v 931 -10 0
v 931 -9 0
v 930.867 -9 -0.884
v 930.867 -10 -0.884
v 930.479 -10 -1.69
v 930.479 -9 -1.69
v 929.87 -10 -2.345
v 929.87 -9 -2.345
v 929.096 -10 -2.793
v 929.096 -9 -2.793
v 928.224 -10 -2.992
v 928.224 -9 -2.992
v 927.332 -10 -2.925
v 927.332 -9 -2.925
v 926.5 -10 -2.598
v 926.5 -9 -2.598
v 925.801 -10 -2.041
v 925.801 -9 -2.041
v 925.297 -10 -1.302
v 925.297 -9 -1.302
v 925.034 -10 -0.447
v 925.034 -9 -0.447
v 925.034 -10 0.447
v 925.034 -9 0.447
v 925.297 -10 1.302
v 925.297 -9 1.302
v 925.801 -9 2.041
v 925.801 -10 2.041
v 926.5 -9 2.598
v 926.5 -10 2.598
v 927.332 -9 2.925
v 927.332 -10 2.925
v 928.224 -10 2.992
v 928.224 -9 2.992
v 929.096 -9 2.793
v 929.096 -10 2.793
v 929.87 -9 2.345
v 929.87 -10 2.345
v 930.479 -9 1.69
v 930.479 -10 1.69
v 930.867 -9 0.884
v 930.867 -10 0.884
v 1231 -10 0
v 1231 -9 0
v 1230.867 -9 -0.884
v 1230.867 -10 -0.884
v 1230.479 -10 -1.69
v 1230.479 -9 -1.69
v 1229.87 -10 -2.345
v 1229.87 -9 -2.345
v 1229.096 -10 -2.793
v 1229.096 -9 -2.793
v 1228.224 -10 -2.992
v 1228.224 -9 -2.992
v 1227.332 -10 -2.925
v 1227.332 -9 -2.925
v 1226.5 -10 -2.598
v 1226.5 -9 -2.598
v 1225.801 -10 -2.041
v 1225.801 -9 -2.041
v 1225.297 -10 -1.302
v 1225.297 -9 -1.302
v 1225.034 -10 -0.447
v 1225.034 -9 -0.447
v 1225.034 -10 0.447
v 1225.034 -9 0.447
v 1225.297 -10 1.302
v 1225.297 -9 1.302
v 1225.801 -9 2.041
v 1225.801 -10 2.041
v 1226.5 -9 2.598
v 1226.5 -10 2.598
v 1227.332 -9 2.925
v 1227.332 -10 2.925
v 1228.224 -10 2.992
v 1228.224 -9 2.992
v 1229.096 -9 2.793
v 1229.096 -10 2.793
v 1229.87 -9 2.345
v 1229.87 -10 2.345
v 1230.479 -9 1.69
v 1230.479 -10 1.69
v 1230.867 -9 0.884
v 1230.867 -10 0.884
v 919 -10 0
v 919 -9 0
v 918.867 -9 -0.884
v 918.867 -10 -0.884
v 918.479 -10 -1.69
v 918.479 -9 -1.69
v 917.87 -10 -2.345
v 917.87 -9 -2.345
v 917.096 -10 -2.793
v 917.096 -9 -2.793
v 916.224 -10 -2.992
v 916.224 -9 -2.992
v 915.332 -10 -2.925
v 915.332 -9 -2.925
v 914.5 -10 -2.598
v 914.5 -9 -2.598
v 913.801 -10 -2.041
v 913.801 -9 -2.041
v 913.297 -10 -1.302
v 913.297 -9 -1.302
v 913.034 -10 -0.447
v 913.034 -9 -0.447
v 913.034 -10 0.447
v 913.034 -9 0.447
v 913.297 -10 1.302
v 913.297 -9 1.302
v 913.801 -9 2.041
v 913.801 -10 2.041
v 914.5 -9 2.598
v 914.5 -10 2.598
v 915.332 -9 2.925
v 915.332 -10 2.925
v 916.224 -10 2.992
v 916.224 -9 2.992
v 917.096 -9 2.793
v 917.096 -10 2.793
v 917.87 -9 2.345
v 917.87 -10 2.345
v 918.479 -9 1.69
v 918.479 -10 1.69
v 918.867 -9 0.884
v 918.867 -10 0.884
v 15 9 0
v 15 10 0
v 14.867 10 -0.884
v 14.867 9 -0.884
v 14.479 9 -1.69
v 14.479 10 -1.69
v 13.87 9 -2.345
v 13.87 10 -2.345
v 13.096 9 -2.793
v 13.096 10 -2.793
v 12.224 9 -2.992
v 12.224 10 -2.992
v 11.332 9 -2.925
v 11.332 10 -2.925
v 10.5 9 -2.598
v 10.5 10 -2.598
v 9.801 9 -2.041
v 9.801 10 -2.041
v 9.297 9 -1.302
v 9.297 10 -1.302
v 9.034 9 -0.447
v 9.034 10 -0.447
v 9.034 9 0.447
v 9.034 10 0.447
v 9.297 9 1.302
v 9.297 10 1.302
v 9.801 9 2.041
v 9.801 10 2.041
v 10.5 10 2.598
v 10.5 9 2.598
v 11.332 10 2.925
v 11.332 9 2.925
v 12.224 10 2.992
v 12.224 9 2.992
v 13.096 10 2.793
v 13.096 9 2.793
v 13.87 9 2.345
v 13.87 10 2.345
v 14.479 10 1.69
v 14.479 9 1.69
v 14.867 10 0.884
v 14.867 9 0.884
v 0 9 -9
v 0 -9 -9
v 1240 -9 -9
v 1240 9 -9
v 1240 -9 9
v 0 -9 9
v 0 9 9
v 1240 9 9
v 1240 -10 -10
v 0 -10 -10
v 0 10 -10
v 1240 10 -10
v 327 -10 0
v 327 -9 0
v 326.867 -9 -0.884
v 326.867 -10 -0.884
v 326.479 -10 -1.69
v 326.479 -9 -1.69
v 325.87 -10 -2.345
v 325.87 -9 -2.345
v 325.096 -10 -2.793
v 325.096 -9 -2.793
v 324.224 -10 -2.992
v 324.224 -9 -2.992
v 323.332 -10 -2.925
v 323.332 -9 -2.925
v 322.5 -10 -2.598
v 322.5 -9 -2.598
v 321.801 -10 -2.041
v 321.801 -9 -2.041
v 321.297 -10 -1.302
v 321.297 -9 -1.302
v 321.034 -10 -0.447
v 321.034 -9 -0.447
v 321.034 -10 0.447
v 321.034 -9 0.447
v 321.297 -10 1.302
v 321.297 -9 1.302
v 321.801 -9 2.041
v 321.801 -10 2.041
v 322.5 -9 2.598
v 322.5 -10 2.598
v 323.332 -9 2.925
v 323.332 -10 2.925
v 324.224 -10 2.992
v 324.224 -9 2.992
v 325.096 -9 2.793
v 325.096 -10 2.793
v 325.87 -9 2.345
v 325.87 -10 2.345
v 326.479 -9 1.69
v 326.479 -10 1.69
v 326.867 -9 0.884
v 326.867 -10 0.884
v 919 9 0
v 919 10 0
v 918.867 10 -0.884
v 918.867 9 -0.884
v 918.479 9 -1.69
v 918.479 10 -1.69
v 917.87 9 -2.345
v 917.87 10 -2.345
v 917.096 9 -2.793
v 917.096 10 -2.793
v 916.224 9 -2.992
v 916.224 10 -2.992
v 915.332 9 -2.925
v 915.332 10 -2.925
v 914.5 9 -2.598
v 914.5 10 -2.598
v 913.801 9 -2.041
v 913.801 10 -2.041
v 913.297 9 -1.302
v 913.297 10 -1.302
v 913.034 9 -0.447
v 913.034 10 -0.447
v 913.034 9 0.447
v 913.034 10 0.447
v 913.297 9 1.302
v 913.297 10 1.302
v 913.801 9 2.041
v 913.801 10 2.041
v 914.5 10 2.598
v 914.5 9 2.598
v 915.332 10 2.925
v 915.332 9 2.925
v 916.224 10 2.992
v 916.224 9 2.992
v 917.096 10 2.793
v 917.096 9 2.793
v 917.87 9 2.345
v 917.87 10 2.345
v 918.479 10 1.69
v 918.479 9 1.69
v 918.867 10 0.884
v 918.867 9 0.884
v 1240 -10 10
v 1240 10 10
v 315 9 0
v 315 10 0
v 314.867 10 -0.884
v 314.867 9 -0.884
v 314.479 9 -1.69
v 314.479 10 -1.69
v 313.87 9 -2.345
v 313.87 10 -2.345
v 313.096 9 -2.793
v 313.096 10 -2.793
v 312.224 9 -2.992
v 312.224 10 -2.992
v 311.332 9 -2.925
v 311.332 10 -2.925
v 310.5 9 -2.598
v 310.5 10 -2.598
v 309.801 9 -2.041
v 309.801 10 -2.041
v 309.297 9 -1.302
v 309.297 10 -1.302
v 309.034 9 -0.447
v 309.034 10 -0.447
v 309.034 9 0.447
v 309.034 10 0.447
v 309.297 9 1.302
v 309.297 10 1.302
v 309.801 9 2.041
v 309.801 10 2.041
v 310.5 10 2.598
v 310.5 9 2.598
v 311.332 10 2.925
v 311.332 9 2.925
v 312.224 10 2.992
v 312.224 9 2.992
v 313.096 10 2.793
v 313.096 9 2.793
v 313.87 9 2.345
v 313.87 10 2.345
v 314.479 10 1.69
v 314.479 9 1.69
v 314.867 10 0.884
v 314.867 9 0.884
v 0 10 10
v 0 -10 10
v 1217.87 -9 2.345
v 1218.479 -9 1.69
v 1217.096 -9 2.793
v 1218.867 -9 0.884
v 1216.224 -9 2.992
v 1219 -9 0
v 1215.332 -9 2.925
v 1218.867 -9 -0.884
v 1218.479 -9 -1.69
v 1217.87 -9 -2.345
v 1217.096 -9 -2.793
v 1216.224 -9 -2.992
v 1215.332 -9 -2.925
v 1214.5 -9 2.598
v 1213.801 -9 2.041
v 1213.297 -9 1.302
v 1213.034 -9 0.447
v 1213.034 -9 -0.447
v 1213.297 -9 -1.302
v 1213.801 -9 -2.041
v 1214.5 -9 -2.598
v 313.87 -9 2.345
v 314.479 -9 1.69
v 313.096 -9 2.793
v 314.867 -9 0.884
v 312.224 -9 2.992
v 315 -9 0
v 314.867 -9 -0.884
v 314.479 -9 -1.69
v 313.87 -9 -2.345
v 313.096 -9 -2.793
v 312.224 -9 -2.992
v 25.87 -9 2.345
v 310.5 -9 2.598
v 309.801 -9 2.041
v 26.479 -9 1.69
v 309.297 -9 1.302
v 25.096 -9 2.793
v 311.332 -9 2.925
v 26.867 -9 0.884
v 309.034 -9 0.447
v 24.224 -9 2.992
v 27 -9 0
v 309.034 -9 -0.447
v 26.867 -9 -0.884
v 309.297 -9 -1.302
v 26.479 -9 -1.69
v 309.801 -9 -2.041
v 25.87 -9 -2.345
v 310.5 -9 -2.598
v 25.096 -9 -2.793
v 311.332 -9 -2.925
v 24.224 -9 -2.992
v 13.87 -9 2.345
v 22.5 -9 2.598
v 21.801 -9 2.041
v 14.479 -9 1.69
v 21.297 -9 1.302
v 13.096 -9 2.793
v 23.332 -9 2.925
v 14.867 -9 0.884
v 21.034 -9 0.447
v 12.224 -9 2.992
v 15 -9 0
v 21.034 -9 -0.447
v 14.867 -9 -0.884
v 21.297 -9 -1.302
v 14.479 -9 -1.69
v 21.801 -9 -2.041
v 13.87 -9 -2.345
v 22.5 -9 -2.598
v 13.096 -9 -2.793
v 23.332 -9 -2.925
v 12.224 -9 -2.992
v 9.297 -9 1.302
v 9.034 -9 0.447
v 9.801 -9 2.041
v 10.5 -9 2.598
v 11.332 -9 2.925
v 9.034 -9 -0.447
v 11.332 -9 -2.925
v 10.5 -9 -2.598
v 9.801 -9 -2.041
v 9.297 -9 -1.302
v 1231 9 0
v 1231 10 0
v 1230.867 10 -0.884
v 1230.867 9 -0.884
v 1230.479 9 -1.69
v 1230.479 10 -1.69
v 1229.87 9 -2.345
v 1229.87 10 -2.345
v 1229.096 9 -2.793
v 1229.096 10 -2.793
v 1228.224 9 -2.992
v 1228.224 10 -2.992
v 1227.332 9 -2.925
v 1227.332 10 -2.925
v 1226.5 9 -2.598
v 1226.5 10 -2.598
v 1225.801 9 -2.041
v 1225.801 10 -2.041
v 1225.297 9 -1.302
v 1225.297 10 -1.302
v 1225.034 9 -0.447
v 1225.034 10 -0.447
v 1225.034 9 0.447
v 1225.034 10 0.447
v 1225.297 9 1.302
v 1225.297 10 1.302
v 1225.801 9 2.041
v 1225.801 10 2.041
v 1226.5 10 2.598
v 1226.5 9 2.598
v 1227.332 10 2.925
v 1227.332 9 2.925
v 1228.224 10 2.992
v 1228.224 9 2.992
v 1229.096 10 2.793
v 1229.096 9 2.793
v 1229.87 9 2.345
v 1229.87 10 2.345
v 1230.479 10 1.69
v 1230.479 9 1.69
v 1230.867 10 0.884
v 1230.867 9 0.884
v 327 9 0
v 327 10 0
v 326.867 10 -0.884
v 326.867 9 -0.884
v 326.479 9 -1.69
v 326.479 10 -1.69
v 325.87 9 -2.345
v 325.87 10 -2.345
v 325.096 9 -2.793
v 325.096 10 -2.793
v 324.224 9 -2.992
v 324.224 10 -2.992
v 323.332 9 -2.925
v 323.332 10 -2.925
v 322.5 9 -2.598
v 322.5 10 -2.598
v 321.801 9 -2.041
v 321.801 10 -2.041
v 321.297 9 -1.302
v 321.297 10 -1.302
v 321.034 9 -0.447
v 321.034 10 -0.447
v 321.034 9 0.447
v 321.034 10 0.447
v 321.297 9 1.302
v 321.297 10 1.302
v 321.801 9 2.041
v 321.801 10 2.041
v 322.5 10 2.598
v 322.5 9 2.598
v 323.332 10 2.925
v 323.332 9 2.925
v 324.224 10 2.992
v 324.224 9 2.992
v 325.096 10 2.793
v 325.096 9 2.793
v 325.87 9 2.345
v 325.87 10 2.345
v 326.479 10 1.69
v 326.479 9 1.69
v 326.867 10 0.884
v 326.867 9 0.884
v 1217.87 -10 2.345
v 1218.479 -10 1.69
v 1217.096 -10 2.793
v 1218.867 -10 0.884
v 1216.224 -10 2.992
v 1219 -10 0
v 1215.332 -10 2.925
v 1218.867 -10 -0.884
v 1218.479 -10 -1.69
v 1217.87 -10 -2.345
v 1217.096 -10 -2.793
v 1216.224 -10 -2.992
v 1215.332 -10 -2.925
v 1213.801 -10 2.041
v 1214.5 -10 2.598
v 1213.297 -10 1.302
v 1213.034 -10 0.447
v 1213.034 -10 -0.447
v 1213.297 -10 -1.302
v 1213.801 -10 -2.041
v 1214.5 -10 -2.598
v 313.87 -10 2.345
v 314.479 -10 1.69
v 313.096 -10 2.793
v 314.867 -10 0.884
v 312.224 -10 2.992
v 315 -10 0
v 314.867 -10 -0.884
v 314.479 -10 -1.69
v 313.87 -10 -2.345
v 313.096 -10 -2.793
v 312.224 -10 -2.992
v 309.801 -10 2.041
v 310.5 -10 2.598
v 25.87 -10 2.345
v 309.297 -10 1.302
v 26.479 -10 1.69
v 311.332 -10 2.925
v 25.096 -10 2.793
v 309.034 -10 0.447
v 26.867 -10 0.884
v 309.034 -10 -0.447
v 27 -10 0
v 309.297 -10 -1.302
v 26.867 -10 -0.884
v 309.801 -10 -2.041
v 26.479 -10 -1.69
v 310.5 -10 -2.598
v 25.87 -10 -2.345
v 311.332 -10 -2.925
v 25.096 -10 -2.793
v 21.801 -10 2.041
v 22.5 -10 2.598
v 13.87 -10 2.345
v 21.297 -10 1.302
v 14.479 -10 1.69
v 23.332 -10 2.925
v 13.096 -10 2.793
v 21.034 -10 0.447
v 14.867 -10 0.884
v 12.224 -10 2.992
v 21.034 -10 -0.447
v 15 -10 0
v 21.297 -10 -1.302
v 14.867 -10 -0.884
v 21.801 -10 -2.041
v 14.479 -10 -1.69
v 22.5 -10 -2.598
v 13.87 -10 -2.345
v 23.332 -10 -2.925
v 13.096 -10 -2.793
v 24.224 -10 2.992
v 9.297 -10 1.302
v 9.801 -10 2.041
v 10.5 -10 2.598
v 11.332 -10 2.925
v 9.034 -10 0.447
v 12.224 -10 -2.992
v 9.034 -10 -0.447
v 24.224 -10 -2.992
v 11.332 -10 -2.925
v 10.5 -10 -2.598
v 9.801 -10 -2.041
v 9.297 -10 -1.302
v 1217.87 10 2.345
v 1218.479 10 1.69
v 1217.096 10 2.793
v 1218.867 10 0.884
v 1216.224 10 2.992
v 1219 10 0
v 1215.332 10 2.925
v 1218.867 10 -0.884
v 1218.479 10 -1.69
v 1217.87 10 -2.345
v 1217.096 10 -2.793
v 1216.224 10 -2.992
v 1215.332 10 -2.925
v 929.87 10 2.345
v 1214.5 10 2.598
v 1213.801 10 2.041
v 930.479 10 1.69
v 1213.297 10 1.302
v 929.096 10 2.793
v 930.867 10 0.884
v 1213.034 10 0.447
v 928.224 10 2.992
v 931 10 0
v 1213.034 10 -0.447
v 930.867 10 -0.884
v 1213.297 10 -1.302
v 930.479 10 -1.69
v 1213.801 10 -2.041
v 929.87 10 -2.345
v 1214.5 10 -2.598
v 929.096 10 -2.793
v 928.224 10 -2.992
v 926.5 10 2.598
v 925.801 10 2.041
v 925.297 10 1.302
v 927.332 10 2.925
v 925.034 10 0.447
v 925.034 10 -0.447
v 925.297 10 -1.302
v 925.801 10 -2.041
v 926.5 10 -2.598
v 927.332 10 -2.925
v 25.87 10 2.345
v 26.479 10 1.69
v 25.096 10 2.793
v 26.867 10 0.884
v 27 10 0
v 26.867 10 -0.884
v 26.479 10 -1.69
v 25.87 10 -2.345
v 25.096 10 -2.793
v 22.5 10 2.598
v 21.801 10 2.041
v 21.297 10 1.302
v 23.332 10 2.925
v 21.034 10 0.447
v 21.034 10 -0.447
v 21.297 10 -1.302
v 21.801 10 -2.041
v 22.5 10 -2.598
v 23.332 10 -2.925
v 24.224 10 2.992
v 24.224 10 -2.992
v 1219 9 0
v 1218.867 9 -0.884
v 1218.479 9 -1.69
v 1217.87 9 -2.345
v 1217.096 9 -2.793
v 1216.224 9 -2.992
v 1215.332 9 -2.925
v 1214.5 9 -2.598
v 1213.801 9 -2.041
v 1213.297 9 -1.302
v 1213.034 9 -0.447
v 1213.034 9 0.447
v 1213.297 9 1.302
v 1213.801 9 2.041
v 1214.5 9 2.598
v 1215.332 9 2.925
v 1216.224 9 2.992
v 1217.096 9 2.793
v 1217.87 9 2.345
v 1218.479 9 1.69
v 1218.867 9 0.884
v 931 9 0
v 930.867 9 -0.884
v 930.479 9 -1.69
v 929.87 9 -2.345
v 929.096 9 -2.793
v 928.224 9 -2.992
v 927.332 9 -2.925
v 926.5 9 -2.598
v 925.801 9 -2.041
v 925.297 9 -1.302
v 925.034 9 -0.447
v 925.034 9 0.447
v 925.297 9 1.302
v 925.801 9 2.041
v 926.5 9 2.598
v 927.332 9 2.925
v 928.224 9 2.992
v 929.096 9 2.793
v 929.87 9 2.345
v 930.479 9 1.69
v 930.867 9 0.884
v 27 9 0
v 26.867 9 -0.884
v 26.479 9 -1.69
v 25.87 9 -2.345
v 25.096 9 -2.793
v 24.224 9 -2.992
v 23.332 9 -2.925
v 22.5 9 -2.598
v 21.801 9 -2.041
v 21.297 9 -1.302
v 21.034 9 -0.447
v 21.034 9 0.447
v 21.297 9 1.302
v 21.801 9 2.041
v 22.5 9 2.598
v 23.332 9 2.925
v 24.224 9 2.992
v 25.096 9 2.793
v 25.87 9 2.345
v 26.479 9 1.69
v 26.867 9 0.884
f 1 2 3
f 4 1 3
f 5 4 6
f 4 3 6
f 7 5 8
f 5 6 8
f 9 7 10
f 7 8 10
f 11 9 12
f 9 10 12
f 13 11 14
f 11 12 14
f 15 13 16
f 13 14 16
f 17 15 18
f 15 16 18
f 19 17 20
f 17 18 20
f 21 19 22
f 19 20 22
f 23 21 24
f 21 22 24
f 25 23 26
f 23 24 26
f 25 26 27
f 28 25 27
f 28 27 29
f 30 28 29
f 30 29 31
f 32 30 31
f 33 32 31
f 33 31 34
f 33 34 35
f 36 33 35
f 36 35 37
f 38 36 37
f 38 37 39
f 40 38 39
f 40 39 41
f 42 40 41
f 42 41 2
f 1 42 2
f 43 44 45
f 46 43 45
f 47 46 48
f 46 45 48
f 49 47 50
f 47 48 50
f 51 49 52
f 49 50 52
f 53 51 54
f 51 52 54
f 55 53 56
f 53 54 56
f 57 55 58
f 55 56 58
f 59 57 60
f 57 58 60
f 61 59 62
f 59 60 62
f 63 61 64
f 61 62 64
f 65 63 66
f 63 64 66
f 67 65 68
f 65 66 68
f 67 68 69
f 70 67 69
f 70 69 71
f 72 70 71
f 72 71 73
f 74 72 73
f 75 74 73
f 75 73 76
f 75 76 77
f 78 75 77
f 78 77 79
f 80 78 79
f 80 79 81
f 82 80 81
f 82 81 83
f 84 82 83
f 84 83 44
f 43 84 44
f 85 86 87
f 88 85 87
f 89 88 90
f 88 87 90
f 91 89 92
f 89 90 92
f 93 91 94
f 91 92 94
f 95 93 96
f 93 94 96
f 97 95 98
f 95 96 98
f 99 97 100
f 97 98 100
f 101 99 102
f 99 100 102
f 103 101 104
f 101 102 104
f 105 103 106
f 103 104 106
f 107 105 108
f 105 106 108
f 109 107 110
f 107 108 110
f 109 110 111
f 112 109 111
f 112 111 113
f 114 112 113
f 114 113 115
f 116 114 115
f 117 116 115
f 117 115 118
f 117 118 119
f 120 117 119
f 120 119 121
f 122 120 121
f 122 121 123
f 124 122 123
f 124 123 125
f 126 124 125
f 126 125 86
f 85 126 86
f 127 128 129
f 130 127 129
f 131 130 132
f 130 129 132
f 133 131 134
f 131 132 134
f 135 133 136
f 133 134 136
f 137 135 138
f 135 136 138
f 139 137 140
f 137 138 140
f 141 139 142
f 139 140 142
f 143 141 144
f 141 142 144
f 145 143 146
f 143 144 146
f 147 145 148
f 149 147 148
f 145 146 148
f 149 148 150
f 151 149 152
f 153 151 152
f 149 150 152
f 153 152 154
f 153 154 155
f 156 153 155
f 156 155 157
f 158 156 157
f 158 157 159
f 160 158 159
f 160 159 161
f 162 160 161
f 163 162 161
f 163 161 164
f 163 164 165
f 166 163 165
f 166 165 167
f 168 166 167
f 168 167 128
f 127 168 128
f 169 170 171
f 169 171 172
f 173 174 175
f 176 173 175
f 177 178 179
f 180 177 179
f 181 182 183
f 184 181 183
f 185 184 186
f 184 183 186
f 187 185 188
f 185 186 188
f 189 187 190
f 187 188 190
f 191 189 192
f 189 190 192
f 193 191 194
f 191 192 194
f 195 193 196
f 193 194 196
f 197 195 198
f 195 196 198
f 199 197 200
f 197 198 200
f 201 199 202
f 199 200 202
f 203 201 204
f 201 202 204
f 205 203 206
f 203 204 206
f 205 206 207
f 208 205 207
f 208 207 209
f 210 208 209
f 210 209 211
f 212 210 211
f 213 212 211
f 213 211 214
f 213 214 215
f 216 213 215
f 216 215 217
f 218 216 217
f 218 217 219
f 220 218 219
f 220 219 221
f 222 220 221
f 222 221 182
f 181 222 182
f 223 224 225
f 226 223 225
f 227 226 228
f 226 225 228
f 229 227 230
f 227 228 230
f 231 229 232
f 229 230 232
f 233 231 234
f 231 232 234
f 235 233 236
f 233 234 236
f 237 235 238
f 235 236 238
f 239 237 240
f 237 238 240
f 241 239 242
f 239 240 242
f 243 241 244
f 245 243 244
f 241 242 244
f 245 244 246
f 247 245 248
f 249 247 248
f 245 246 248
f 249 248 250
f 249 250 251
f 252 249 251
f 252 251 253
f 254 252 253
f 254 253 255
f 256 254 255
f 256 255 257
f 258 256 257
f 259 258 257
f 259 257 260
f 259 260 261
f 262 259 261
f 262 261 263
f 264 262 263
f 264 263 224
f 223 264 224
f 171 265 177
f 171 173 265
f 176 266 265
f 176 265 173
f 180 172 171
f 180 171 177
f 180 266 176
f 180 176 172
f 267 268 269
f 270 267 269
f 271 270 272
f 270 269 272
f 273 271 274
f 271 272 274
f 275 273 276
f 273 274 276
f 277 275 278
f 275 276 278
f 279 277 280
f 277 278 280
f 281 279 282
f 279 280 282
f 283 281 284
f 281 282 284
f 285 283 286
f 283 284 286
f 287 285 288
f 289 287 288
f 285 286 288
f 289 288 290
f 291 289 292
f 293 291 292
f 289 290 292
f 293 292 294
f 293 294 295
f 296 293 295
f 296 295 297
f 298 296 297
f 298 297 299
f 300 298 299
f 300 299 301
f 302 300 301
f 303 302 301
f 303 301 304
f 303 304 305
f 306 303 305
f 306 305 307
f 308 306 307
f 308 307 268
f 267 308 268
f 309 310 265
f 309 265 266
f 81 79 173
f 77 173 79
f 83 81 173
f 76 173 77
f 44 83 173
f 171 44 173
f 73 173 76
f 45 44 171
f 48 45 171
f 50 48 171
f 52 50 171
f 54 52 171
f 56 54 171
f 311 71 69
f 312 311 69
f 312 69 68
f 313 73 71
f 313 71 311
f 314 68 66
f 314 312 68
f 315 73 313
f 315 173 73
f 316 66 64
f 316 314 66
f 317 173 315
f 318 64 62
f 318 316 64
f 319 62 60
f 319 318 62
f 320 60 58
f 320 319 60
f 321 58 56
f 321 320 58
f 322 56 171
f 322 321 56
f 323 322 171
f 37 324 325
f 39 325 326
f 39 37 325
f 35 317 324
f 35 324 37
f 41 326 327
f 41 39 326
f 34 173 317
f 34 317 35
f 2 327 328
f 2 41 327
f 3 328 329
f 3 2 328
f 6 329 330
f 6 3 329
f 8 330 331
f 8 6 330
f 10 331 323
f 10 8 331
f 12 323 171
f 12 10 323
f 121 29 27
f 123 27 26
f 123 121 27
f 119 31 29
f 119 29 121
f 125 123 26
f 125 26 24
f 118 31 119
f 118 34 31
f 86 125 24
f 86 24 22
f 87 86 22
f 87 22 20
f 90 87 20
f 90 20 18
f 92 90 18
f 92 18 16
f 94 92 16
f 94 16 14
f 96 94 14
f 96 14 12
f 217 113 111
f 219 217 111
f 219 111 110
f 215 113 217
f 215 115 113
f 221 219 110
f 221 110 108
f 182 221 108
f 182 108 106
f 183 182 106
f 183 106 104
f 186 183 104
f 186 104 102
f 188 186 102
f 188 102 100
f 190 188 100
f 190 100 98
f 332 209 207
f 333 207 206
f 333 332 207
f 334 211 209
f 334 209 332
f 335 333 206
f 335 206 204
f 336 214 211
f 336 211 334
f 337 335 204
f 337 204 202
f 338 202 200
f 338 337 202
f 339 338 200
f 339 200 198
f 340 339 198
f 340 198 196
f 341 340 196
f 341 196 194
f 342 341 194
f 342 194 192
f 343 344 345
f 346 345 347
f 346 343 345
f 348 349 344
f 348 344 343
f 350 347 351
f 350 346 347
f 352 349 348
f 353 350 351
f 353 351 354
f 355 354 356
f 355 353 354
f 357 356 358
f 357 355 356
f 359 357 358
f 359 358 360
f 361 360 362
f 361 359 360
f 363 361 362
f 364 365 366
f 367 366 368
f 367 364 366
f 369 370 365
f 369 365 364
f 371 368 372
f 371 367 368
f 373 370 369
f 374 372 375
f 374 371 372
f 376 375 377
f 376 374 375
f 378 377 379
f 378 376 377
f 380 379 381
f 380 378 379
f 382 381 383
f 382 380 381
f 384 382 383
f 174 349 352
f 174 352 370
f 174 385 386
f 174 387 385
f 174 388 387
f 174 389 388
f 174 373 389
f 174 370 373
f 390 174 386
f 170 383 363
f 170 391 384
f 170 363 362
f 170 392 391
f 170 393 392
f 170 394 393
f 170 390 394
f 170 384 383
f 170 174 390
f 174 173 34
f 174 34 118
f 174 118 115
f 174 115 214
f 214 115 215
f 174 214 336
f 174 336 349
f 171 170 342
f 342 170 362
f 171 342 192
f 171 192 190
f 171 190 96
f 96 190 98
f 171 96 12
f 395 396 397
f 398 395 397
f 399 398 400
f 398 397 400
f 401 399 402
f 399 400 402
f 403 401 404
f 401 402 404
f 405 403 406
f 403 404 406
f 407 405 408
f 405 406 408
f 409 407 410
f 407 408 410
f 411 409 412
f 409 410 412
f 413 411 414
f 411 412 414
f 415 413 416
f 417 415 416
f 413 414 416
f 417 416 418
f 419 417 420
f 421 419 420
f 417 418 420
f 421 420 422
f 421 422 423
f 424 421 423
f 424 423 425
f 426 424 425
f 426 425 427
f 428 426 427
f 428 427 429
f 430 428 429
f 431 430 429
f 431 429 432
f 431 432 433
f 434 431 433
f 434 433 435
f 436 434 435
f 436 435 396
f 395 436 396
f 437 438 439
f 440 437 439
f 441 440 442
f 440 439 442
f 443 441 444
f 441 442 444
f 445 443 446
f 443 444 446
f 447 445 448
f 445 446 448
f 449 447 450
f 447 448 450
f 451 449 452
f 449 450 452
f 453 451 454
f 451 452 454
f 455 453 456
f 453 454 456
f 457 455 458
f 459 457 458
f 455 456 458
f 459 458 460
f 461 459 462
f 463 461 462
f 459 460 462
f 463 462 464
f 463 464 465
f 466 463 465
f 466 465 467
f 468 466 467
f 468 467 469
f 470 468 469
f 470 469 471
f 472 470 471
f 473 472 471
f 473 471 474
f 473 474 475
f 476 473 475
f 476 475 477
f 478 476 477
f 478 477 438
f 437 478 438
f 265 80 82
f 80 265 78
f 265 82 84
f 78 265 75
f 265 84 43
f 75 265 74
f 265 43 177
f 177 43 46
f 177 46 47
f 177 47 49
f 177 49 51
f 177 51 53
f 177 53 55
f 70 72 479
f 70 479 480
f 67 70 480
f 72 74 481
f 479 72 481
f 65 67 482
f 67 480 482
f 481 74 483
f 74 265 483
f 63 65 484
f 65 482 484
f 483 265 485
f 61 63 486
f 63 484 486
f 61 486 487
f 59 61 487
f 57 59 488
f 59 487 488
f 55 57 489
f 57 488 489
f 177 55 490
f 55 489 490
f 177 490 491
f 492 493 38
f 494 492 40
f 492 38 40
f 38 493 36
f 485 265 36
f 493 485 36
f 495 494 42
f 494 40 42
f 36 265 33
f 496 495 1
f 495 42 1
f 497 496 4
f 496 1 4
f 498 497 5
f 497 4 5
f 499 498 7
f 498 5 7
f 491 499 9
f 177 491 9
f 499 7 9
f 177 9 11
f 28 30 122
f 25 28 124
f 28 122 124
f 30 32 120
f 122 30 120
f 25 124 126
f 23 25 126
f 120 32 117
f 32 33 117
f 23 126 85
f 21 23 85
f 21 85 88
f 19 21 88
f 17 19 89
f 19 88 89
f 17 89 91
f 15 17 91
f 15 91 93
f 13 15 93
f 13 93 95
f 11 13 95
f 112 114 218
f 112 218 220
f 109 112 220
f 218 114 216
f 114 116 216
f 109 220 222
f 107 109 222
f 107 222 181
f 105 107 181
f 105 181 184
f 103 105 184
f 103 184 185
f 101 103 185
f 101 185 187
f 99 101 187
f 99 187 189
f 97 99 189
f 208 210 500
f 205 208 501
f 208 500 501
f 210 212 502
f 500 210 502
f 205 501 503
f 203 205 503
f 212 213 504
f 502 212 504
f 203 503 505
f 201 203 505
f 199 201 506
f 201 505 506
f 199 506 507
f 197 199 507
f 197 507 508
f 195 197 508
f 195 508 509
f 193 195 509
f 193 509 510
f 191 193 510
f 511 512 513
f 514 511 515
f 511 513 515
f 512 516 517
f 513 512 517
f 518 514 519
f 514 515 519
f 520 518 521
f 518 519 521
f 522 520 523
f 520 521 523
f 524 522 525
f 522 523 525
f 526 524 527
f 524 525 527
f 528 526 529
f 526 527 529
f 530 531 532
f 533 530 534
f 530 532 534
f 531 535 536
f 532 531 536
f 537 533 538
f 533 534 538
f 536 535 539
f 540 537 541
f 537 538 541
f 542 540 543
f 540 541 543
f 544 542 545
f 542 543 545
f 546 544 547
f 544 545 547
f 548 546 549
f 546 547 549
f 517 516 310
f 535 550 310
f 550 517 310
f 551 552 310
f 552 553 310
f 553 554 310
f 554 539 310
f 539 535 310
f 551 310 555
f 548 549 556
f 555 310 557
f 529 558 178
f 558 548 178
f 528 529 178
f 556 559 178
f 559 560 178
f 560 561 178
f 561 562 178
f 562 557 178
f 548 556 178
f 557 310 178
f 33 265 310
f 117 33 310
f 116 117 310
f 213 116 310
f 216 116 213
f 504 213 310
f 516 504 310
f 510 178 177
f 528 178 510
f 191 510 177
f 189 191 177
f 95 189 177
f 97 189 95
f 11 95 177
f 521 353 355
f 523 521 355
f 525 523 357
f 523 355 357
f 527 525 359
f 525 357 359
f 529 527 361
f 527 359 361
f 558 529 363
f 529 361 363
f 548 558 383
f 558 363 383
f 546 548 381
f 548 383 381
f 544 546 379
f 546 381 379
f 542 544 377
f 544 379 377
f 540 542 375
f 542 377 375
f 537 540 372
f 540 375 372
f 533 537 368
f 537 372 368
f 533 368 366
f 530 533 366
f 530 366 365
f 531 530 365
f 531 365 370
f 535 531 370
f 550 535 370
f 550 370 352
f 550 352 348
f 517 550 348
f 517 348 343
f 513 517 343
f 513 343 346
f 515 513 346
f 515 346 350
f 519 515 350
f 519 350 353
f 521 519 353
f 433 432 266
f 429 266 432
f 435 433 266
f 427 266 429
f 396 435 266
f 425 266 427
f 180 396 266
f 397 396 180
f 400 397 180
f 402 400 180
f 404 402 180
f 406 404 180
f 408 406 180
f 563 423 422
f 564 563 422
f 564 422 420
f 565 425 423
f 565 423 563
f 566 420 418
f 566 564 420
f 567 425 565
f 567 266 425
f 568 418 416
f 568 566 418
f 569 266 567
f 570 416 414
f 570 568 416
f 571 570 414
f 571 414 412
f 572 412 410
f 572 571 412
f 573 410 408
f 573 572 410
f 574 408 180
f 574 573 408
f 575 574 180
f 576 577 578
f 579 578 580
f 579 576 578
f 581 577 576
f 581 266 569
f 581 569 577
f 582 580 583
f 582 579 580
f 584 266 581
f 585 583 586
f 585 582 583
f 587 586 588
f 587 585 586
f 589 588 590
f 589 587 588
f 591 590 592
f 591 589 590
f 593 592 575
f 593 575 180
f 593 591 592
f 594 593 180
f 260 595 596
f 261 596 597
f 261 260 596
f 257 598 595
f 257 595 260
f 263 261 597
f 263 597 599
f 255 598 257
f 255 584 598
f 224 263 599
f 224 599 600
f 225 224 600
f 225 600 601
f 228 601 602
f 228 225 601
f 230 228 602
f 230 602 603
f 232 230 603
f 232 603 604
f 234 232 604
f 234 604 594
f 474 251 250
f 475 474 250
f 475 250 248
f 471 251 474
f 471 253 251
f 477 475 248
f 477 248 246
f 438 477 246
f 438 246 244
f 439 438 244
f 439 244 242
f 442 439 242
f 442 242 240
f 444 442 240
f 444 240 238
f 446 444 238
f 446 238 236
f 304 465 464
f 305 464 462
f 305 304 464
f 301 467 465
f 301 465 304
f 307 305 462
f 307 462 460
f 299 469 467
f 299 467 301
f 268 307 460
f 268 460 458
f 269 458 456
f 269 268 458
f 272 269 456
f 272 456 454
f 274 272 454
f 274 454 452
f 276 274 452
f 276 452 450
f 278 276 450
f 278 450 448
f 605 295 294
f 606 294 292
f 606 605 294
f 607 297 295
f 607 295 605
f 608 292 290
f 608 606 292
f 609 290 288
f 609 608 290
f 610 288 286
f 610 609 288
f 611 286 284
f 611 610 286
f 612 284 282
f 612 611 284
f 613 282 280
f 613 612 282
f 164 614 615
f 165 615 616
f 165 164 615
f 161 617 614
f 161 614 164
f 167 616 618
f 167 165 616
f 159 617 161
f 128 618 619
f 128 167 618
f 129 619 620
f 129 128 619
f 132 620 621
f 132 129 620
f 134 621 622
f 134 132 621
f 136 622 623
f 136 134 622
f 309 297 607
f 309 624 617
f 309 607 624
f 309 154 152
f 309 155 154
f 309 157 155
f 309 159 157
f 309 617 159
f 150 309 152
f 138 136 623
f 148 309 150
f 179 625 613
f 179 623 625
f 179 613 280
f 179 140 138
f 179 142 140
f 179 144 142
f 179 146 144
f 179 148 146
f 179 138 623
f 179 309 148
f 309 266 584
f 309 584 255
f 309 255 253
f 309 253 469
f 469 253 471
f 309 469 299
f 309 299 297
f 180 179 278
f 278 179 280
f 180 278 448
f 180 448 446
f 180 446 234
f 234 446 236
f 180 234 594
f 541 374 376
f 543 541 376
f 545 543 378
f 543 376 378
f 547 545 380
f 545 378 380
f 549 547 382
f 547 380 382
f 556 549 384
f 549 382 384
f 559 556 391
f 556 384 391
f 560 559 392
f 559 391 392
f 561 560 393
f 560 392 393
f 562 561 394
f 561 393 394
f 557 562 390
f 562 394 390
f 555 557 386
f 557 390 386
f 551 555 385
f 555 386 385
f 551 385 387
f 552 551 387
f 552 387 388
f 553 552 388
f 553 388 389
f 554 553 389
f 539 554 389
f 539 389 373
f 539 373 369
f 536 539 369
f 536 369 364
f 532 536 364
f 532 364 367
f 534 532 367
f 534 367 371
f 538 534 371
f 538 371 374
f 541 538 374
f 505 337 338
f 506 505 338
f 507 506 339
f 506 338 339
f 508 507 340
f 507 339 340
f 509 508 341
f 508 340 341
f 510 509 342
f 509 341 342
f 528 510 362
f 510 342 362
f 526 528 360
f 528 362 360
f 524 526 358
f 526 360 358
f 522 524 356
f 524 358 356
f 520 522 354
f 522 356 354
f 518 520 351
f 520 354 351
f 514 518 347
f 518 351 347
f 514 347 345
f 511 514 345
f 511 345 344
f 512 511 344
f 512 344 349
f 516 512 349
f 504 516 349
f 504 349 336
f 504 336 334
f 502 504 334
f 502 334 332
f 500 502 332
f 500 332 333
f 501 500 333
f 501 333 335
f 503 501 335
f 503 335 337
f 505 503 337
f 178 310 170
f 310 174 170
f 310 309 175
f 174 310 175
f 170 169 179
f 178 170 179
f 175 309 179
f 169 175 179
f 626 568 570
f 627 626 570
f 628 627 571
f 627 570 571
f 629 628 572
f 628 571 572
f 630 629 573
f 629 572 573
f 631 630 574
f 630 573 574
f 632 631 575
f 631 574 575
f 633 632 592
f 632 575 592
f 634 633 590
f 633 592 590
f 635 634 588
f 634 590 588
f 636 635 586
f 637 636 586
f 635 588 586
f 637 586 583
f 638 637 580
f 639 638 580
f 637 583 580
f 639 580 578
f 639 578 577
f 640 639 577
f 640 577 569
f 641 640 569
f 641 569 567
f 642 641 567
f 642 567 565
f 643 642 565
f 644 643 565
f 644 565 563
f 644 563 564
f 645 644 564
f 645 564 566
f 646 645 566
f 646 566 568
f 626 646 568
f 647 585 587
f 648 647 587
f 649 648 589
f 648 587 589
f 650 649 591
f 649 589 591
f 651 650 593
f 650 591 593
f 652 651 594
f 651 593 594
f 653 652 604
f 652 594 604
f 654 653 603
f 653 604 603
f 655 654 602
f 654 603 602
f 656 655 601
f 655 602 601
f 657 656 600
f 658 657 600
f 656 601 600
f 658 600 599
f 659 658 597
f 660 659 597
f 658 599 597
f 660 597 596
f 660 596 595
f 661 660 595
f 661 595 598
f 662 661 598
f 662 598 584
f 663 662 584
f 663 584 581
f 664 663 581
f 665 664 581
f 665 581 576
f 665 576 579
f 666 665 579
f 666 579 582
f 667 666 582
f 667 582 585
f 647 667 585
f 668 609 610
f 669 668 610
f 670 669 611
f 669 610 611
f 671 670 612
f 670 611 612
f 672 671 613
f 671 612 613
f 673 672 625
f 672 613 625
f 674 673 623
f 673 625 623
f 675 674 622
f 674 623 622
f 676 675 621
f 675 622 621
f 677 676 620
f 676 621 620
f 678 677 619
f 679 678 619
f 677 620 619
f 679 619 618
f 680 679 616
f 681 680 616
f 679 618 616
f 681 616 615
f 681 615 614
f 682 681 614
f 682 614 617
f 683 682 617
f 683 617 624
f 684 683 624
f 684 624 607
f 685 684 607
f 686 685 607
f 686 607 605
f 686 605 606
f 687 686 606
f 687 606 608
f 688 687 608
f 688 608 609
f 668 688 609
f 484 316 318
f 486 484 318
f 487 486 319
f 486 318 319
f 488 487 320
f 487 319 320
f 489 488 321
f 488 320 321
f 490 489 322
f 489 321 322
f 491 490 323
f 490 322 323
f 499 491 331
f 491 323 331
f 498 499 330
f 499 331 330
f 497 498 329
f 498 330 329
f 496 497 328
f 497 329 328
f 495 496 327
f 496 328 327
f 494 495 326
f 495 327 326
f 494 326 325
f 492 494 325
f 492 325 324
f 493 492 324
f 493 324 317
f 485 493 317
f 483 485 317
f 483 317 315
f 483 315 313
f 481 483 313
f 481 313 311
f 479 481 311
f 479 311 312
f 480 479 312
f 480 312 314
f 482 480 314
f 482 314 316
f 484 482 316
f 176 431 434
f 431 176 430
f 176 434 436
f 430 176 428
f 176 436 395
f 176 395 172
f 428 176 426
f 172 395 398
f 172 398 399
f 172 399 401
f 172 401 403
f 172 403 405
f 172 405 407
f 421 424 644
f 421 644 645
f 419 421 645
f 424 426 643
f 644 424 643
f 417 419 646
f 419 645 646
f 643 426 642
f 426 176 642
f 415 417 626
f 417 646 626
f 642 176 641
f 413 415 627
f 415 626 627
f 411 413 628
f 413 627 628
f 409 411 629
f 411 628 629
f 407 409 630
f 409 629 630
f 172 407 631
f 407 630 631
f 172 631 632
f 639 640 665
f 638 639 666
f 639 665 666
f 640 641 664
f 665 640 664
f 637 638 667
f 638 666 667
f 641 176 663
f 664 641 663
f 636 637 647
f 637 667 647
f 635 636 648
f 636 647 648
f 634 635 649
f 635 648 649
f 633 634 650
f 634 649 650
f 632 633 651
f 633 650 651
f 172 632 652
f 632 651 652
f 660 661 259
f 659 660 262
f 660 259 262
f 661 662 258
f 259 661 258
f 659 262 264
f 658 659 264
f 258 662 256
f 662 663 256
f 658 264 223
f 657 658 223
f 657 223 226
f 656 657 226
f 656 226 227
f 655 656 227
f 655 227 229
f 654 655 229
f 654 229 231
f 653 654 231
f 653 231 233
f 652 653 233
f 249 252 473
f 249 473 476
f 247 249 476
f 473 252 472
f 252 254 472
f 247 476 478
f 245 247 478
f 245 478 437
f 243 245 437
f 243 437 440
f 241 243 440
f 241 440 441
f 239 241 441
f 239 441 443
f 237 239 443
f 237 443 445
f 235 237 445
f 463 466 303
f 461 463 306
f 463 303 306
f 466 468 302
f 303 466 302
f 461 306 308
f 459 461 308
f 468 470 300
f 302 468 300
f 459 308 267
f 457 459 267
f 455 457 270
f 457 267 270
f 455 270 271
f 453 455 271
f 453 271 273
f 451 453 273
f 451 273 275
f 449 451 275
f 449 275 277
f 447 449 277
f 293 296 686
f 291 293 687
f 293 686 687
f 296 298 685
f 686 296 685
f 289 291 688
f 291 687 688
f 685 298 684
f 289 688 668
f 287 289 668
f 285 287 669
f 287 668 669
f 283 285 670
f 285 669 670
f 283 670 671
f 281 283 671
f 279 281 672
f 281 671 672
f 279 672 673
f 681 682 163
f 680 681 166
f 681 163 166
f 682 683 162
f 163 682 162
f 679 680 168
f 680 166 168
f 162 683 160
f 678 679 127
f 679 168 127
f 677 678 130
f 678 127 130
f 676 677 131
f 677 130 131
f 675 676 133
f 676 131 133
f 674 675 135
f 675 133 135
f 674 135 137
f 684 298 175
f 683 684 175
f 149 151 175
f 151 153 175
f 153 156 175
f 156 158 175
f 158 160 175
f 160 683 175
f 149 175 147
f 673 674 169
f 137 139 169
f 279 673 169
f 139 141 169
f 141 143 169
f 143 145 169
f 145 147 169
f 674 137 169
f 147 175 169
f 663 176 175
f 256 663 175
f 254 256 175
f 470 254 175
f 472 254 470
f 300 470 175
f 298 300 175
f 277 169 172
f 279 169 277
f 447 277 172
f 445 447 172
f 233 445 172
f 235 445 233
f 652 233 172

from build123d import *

# Parameters (mm, degrees)
SKETCH1_W           = 20
SKETCH1_H           = 20
SKETCH1_W_2         = 18
SKETCH1_H_2         = 18
BOSS_EXTRUDE1_DEPTH = 1240
SKETCH2_R           = 3
CUT_EXTRUDE1_DEPTH  = 1240


with BuildPart() as part:
    # Sketch1 → Boss-Extrude1 (new body)
    with BuildSketch(Plane(origin=(0, 0, 0), x_dir=(0, 0, -1), z_dir=(1, 0, 0))):
        Rectangle(SKETCH1_W, SKETCH1_H)
        Rectangle(SKETCH1_W_2, SKETCH1_H_2, mode=Mode.SUBTRACT)
    extrude(amount=BOSS_EXTRUDE1_DEPTH)

    # Sketch2 → Cut-Extrude1 (cut)
    with BuildSketch(Plane(origin=(0, 10, 0), x_dir=(1, 0, 0), z_dir=(0, 1, 0))):
        with Locations((12, 0)):
            Circle(SKETCH2_R)
        with Locations((24, 0)):
            Circle(SKETCH2_R)
        with Locations((1216, 0)):
            Circle(SKETCH2_R)
        with Locations((1228, 0)):
            Circle(SKETCH2_R)
        with Locations((324, 0)):
            Circle(SKETCH2_R)
        with Locations((312, 0)):
            Circle(SKETCH2_R)
        with Locations((916, 0)):
            Circle(SKETCH2_R)
        with Locations((928, 0)):
            Circle(SKETCH2_R)
    extrude(amount=-CUT_EXTRUDE1_DEPTH, mode=Mode.SUBTRACT)


solid = part.part
